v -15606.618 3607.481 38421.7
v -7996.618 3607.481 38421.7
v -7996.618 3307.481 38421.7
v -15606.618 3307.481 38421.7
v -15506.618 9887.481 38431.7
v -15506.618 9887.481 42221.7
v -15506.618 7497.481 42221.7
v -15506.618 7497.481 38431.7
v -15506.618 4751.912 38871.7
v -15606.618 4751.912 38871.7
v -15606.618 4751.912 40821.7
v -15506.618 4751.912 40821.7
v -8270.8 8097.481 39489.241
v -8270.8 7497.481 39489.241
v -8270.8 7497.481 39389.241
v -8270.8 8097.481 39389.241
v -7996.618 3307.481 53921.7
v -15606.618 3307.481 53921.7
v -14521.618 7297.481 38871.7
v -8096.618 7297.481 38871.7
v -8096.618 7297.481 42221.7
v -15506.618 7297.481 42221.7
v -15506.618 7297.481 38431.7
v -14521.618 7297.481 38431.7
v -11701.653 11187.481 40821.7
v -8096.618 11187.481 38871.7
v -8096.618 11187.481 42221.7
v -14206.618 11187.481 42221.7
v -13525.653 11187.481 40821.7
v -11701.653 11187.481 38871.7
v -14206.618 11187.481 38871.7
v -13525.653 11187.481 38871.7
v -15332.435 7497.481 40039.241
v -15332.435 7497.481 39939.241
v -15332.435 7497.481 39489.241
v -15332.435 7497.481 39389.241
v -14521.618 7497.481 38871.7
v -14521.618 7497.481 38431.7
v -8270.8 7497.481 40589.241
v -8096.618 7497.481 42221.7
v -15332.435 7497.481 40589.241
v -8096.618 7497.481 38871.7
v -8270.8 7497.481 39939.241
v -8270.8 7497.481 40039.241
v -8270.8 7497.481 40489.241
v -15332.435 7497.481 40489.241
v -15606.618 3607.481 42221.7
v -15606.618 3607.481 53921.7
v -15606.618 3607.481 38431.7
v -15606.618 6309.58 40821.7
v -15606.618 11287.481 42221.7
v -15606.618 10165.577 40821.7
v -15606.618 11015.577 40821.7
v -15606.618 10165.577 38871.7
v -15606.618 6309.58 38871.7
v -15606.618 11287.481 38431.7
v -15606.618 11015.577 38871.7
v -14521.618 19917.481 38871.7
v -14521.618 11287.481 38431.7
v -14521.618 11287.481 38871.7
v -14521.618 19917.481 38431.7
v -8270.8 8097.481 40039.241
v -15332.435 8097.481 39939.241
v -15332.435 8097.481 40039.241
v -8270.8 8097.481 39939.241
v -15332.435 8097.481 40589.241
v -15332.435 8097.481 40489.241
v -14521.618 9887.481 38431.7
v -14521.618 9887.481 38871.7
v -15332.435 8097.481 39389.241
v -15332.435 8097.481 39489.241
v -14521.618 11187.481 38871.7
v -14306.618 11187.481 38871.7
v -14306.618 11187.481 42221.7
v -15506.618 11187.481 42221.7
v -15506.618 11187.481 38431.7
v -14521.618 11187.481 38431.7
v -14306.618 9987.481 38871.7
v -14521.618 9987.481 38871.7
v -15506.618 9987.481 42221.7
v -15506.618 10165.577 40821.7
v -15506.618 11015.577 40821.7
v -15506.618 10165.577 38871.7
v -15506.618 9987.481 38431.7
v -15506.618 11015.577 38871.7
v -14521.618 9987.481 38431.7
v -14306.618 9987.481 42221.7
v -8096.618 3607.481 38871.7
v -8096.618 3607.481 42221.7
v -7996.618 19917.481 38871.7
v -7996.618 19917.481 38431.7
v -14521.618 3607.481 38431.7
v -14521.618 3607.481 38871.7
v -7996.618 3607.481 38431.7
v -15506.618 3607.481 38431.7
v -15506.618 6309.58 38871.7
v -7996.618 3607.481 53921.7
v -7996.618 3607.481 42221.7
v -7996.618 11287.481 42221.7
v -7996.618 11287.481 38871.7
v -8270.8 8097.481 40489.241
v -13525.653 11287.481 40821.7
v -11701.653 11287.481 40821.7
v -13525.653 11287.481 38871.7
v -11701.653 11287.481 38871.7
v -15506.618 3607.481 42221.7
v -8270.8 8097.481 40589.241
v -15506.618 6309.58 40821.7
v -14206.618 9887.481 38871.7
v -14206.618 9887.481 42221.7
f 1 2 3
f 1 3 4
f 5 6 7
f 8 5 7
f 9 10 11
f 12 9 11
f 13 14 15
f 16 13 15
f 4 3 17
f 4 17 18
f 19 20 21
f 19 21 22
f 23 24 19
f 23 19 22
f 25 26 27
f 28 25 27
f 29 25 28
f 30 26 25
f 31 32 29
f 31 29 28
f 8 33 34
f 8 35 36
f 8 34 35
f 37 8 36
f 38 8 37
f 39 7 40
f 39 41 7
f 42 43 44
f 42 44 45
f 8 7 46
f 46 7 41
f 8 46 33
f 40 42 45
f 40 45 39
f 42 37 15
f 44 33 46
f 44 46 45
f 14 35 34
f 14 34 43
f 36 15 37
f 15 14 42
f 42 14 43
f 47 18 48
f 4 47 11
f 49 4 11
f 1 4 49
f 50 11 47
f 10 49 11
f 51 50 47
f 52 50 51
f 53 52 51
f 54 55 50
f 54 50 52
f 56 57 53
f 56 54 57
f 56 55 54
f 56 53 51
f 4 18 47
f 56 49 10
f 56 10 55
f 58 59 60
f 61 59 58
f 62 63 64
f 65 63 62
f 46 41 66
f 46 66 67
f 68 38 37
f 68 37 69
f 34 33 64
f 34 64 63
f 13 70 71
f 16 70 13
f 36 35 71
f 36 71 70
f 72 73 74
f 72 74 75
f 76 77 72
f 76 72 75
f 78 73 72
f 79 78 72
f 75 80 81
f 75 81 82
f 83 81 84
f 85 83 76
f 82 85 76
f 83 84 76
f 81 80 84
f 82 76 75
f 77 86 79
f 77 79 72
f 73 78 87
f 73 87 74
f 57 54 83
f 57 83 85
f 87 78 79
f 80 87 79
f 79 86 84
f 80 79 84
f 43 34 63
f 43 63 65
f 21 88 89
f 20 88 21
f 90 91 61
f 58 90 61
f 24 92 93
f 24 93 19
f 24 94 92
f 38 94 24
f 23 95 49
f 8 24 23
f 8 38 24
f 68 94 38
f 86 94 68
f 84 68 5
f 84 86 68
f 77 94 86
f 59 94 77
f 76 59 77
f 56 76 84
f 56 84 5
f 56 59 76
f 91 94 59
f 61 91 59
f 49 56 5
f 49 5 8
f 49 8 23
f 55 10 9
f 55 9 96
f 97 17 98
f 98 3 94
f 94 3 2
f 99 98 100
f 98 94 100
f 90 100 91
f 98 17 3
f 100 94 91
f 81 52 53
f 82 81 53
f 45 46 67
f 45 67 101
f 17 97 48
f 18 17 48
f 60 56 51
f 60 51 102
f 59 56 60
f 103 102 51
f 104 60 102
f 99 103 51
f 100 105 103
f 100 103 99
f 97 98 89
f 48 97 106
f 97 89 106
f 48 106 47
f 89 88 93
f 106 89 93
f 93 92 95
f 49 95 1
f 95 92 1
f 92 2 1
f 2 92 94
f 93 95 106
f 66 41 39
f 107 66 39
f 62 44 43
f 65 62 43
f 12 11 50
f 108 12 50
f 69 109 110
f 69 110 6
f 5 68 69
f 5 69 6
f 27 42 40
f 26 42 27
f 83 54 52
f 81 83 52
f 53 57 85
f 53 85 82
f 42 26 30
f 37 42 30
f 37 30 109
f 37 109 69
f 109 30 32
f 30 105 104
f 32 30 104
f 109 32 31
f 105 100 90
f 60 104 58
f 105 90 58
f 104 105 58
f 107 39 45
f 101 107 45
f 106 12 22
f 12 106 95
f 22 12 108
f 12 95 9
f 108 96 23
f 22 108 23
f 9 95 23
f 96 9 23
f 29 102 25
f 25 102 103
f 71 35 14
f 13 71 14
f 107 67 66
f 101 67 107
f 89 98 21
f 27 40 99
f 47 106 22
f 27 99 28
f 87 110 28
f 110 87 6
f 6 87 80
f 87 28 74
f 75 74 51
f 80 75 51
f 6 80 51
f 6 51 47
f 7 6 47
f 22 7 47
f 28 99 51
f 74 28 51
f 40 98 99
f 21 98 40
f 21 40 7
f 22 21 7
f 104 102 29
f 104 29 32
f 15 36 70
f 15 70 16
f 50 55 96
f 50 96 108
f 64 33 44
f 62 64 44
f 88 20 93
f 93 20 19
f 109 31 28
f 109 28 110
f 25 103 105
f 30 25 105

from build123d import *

# Parameters (mm, degrees)
SKETCH1_W           = 6525
SKETCH1_H           = 16410
BOSS_EXTRUDE1_DEPTH = 440
SKETCH2_W           = 7410
SKETCH2_H           = 3690
SKETCH2_W_2         = 1200
SKETCH2_H_2         = 1200
BOSS_EXTRUDE2_DEPTH = 3790
SKETCH3_W           = 1824
SKETCH3_H           = 1950
CUT_EXTRUDE1_DEPTH  = 665
SKETCH4_W           = 1950
SKETCH4_H           = 850
SKETCH4_H_2         = 1557.668186724
CUT_EXTRUDE2_DEPTH  = 736
SKETCH5_W           = 7061.635181126
SKETCH5_H           = 100
BOSS_EXTRUDE3_DEPTH = 600
LPATTERN1_COUNT     = 3
LPATTERN1_PITCH     = 550
SKETCH7_W           = 7610
SKETCH7_H           = 300
BOSS_EXTRUDE4_DEPTH = 15500


with BuildPart() as part:
    # Sketch1 → Boss-Extrude1 (new body)
    with BuildSketch(Plane(origin=(0, 0, 38431.700196057), x_dir=(-1, 0, 0), z_dir=(0, 0, -1))):
        with Locations((11259.117683291, 11712.481366586)):
            Rectangle(SKETCH1_W, SKETCH1_H)
    extrude(amount=-BOSS_EXTRUDE1_DEPTH)

    # Sketch2 → Boss-Extrude2 (add)
    with BuildSketch(Plane(origin=(0, 0, 38431.700196057), x_dir=(-1, 0, 0), z_dir=(0, 0, -1))):
        Polygon((15606.617683291, 11287.481366586), (7996.617683291, 11287.481366586), (7996.617683291, 11187.481366586), (7996.617683291, 3507.481366586), (15606.617683291, 3507.481366586), align=None)
        with Locations((11801.617683291, 5452.481366586)):
            Rectangle(SKETCH2_W, SKETCH2_H, mode=Mode.SUBTRACT)
        Polygon((8096.617683291, 7497.481366586), (8096.617683291, 11187.481366586), (14206.617683291, 11187.481366586), (14206.617683291, 9887.481366586), (15506.617683291, 9887.481366586), (15506.617683291, 7497.481366586), align=None, mode=Mode.SUBTRACT)
        with Locations((14906.617683291, 10587.481366586)):
            Rectangle(SKETCH2_W_2, SKETCH2_H_2, mode=Mode.SUBTRACT)
    extrude(amount=-BOSS_EXTRUDE2_DEPTH)

    # Sketch3 → Cut-Extrude1 (cut)
    with BuildSketch(Plane(origin=(0, 11287.481366586, 0), x_dir=(1, 0, 0), z_dir=(0, 1, 0))):
        with Locations((-12613.653311195, -39846.700196057)):
            Rectangle(SKETCH3_W, SKETCH3_H)
    extrude(amount=-CUT_EXTRUDE1_DEPTH, mode=Mode.SUBTRACT)

    # Sketch4 → Cut-Extrude2 (cut)
    with BuildSketch(Plane.ZY.offset(15606.617683291)):
        with Locations((39846.700196057, 10590.577030871)):
            Rectangle(SKETCH4_W, SKETCH4_H)
        with Locations((39846.700196057, 5530.745749443)):
            Rectangle(SKETCH4_W, SKETCH4_H_2)
    extrude(amount=-CUT_EXTRUDE2_DEPTH, mode=Mode.SUBTRACT)

    # Sketch5 → Boss-Extrude3 (add)
    with BuildSketch(Plane(origin=(0, 7497.481366586, 0), x_dir=(1, 0, 0), z_dir=(0, 1, 0))):
        with Locations((-11801.617683291, -40539.241329648)):
            Rectangle(SKETCH5_W, SKETCH5_H)
    boss_extrude3 = extrude(amount=BOSS_EXTRUDE3_DEPTH)

    # LPattern1: Boss-Extrude3 ×3
    with Locations(*[(0, 0, -i * LPATTERN1_PITCH) for i in range(1, LPATTERN1_COUNT)]):
        add(boss_extrude3)

    # Sketch7 → Boss-Extrude4 (add)
    with BuildSketch(Plane(origin=(0, 0, 38421.700196057), x_dir=(-1, 0, 0), z_dir=(0, 0, -1))):
        with Locations((11801.617683291, 3457.481366586)):
            Rectangle(SKETCH7_W, SKETCH7_H)
    extrude(amount=-BOSS_EXTRUDE4_DEPTH)


solid = part.part
